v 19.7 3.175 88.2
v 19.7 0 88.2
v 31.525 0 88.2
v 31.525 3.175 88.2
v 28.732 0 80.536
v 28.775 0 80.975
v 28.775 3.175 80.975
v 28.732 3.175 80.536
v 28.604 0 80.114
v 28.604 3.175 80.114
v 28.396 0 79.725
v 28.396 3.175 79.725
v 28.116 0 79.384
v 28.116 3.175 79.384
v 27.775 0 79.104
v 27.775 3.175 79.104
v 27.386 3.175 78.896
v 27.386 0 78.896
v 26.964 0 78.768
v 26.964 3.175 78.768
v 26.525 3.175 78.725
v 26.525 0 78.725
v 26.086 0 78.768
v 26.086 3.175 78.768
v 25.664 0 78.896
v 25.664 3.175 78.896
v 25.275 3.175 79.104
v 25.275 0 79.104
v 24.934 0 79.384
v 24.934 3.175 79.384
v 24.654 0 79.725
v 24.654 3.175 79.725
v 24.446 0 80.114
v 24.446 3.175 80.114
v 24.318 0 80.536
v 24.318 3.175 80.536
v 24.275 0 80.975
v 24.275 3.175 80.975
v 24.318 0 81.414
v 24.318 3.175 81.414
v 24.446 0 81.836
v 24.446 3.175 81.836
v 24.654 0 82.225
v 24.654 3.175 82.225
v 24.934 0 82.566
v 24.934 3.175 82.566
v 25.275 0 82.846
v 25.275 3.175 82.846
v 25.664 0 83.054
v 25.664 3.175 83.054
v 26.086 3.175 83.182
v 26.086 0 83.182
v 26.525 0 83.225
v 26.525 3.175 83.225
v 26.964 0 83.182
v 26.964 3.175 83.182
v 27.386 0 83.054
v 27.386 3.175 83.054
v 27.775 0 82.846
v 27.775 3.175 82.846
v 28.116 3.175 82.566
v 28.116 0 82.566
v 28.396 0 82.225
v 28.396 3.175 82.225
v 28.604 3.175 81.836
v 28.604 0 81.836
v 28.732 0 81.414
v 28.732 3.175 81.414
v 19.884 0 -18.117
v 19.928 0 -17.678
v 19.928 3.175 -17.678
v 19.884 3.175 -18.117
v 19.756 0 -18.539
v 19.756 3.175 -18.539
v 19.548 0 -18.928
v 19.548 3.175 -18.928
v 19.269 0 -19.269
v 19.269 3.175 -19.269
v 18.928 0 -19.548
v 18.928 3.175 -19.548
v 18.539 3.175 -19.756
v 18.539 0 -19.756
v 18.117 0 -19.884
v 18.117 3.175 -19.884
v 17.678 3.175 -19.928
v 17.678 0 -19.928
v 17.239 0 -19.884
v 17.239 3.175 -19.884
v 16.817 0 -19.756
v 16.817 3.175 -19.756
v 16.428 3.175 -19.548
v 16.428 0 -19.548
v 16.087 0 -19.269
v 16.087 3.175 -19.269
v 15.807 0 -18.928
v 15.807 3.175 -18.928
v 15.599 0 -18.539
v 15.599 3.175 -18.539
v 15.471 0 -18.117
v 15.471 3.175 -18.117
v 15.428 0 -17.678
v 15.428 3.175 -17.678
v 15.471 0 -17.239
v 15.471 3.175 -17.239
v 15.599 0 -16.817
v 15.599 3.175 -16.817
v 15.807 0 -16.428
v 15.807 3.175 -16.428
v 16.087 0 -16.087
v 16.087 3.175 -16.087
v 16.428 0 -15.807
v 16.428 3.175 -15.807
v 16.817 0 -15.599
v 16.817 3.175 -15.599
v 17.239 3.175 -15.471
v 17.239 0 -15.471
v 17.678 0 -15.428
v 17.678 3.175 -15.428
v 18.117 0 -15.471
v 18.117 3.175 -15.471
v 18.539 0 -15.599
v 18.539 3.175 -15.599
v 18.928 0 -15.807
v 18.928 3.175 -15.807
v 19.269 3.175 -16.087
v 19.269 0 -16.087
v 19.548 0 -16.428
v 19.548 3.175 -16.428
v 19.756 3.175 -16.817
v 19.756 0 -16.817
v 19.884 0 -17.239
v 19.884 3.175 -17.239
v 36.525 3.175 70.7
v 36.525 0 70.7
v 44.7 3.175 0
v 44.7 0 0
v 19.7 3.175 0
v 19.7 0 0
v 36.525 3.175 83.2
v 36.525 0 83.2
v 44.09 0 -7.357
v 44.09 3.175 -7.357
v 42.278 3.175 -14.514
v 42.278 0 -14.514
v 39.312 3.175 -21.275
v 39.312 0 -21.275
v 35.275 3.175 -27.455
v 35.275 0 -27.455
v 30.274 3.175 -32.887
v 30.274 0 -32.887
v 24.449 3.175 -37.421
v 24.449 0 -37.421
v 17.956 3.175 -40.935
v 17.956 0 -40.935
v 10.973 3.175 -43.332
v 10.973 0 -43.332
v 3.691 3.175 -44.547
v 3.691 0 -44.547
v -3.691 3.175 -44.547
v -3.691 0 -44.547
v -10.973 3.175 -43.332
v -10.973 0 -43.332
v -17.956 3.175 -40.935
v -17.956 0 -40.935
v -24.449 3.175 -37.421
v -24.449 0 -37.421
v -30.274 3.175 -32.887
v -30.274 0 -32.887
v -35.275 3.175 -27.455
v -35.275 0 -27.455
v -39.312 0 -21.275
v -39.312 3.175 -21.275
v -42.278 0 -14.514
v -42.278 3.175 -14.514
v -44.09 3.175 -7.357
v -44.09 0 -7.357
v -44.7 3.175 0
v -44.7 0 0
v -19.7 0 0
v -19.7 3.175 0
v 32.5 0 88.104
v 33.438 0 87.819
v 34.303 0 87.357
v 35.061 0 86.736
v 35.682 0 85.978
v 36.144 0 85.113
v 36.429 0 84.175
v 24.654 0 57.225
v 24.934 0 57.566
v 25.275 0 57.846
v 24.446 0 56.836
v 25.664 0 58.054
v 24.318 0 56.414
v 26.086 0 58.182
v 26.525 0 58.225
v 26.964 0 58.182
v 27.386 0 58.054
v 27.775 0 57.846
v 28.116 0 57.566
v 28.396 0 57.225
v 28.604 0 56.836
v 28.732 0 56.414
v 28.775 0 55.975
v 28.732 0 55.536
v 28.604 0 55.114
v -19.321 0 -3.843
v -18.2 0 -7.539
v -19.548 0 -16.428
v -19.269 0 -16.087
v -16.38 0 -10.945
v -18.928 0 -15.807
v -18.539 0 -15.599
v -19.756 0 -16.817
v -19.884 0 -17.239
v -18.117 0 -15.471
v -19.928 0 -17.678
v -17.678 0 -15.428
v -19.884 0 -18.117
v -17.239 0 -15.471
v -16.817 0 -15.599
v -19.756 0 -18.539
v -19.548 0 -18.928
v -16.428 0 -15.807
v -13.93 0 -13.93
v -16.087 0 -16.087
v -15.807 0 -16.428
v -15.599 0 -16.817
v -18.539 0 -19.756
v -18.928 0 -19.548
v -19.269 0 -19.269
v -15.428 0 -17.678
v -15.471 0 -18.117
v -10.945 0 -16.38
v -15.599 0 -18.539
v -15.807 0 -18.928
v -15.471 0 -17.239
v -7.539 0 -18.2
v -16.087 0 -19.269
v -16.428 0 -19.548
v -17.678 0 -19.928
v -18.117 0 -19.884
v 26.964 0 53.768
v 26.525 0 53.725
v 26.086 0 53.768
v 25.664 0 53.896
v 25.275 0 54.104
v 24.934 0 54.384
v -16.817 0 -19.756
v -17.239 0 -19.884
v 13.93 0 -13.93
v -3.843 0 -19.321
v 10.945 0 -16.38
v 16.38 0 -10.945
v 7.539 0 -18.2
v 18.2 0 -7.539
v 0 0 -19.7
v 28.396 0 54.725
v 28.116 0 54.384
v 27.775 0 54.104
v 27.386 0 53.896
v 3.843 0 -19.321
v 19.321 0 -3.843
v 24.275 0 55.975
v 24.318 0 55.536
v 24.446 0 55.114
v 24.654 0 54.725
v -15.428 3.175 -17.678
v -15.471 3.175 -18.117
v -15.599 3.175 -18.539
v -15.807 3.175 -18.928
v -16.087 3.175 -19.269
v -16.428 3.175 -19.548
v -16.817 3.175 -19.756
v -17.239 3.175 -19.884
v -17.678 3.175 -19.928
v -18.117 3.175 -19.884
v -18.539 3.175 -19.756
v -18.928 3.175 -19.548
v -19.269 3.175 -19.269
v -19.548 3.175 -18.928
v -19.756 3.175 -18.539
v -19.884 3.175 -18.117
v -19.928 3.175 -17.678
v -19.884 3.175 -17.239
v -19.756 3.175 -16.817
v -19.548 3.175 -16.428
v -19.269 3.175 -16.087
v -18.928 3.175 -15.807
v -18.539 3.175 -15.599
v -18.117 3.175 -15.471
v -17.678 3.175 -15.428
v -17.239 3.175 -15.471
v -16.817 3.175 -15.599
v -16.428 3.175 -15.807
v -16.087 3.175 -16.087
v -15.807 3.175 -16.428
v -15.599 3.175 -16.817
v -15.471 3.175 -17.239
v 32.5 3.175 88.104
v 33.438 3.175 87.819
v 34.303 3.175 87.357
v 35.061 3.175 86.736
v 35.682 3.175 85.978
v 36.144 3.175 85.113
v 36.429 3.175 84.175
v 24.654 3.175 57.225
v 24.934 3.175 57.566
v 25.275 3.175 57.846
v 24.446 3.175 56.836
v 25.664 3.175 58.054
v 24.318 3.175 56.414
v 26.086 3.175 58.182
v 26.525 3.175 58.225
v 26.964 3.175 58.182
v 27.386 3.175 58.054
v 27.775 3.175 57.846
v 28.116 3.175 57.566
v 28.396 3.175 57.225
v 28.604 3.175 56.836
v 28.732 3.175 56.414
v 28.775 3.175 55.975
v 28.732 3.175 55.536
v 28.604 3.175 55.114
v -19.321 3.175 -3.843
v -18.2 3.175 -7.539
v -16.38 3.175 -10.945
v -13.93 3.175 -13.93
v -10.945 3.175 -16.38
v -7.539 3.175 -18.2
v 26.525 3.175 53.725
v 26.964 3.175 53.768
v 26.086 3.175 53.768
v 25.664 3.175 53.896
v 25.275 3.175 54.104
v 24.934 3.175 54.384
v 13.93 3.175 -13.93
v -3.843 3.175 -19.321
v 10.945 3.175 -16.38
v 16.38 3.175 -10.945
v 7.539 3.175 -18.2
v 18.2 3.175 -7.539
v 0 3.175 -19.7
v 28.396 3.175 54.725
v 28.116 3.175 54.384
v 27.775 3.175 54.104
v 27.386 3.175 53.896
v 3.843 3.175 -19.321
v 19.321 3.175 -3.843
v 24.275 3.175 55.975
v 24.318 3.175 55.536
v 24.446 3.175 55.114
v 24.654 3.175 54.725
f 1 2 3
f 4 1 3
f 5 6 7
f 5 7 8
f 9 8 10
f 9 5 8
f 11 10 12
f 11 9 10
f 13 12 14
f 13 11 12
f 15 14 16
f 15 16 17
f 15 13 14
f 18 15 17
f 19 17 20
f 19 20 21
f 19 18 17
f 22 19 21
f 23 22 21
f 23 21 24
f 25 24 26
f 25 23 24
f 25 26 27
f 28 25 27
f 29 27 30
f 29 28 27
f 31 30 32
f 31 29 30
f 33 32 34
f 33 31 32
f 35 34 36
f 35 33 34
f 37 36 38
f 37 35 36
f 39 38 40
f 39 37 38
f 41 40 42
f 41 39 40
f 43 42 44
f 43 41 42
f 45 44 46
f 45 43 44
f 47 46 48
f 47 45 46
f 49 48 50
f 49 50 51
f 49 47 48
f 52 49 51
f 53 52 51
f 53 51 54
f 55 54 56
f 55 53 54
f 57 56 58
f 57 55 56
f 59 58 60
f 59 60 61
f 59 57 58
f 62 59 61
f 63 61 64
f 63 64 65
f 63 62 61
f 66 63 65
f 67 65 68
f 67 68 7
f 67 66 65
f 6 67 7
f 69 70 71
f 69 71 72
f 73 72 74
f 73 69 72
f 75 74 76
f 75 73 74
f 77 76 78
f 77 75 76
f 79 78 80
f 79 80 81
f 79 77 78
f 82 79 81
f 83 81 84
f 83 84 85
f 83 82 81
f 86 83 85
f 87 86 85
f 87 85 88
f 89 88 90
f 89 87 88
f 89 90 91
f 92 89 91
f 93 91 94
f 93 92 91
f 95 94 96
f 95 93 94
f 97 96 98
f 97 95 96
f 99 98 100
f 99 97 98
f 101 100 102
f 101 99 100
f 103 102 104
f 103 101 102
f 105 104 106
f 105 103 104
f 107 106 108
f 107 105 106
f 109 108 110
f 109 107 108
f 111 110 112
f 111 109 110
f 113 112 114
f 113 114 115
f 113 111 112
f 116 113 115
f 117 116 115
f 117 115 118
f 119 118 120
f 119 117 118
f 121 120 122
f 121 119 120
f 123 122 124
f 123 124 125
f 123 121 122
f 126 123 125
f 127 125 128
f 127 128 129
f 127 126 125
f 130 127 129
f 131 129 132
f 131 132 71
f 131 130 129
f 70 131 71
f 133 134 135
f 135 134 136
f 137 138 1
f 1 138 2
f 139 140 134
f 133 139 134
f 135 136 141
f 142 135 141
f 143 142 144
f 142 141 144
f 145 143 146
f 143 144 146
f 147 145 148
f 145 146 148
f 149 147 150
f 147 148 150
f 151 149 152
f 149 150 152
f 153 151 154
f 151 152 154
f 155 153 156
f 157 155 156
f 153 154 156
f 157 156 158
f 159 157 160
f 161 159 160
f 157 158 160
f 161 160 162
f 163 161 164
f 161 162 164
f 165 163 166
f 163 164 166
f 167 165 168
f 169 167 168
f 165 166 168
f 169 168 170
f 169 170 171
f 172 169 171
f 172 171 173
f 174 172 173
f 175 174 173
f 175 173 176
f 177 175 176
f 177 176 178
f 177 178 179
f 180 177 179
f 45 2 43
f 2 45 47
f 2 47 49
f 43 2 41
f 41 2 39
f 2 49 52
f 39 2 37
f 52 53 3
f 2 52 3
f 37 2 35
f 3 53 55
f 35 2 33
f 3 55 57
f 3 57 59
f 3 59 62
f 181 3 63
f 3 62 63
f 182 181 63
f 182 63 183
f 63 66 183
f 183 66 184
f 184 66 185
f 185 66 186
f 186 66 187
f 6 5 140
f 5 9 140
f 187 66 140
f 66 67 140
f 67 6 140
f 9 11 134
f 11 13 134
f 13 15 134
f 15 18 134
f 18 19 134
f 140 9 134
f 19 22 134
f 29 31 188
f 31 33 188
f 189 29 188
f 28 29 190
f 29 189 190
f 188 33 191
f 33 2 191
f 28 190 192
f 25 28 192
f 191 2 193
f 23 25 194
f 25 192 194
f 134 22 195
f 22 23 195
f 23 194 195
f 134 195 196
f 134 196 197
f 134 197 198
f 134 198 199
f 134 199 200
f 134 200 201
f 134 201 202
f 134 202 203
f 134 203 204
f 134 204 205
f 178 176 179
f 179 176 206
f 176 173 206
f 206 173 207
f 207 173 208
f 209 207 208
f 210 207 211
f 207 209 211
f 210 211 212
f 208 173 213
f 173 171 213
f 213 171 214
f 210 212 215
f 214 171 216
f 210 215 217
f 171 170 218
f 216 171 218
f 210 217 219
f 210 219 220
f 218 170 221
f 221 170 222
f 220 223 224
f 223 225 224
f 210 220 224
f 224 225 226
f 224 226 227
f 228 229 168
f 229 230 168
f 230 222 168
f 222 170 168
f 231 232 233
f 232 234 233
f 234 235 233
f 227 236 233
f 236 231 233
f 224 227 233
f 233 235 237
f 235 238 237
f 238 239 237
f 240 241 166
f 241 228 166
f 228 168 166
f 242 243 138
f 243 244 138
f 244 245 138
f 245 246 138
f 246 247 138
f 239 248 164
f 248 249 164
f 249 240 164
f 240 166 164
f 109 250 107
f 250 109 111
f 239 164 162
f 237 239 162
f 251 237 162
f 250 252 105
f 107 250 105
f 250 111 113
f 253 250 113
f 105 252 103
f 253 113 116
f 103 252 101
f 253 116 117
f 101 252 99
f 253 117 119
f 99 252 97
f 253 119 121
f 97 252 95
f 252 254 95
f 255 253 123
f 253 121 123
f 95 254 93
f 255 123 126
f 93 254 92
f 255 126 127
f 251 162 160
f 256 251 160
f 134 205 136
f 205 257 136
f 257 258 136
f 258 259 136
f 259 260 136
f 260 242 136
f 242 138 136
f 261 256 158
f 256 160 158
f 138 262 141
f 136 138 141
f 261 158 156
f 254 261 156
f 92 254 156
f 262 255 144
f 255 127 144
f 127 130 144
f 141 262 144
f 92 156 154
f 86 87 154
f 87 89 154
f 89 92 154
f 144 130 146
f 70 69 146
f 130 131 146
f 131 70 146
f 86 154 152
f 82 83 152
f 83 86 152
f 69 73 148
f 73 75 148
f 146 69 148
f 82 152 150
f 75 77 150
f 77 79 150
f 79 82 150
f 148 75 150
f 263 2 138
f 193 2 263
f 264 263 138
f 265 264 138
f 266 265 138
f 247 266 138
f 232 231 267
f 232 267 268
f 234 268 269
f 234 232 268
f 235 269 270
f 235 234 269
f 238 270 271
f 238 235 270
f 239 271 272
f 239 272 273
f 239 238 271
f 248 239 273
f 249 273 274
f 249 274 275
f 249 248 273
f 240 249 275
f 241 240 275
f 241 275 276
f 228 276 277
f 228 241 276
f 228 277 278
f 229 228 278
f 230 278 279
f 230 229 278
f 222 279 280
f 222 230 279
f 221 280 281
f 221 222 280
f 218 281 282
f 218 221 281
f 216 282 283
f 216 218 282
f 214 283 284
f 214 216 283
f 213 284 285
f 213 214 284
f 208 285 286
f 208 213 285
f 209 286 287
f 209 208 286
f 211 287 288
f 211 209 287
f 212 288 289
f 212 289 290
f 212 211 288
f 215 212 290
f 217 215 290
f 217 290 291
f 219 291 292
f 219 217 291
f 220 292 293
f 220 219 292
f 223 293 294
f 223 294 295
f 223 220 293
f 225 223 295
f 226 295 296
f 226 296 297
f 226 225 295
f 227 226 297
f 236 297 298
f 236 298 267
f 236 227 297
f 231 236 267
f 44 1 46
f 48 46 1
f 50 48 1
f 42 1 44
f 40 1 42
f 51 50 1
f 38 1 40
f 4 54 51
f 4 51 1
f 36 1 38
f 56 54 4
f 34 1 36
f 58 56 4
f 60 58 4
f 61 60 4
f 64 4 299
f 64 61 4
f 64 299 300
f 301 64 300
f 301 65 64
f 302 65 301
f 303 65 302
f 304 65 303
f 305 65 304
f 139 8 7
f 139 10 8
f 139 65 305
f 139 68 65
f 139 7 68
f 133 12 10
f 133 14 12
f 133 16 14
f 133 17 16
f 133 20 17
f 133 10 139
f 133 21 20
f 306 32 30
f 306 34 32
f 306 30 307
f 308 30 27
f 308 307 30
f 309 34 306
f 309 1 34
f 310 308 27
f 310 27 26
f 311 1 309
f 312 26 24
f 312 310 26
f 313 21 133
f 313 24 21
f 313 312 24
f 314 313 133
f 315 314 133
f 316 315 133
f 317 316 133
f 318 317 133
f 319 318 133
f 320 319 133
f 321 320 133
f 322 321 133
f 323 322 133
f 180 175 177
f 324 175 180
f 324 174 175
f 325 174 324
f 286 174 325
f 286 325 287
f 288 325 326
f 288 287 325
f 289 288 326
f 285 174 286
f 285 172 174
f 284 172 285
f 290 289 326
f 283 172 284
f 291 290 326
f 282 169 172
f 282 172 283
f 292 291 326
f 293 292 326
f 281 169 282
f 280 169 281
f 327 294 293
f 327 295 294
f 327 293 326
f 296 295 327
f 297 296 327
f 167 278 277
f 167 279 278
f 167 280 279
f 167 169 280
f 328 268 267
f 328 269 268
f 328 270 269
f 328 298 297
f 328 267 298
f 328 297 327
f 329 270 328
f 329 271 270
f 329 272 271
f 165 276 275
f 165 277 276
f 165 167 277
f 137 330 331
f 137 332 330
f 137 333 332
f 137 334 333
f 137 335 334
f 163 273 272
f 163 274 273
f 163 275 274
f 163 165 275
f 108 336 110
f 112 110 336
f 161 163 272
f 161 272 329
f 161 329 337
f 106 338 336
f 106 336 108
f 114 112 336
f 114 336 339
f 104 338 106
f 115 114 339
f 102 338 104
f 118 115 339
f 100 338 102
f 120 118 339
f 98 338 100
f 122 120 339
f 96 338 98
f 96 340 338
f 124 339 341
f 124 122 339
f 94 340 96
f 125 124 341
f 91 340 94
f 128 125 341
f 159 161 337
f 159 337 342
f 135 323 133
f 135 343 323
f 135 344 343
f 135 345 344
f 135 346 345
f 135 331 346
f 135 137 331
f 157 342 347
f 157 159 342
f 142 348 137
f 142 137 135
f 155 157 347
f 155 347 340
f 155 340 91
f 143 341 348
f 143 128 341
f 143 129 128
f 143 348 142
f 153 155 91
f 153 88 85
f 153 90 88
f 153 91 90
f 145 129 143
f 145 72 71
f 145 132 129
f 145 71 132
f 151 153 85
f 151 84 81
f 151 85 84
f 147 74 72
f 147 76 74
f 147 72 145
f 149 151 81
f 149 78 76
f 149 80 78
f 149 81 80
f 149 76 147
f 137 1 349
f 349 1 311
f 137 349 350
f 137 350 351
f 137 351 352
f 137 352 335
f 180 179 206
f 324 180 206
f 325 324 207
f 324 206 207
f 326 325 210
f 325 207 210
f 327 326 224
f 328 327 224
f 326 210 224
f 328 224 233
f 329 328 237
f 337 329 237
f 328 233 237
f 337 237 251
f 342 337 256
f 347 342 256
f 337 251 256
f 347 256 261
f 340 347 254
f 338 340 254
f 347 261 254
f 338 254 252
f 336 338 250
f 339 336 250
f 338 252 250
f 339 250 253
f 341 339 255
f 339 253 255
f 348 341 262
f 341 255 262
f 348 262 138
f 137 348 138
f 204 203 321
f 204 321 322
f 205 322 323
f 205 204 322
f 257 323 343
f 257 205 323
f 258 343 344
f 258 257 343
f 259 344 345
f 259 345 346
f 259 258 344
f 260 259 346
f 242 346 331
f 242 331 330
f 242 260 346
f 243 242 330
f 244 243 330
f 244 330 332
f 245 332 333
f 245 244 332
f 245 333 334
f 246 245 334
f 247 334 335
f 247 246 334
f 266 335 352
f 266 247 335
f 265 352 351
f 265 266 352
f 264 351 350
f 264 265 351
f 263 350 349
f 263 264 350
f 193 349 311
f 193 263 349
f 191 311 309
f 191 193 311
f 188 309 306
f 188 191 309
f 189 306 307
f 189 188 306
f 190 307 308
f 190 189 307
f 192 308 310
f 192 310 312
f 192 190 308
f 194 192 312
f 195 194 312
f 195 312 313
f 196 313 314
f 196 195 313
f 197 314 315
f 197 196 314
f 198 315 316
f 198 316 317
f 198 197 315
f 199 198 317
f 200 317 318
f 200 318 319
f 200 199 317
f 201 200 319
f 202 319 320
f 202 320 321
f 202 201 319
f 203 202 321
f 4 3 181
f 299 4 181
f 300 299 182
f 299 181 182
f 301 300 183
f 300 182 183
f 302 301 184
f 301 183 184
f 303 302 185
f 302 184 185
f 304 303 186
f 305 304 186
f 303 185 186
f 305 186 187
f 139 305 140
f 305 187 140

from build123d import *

# Parameters (mm, degrees)
SKETCH2_R           = 2.25
BOSS_EXTRUDE1_DEPTH = 3.175


with BuildPart() as part:
    # Sketch2 → Boss-Extrude1 (new body)
    with BuildSketch(Plane(origin=(0, 0, 0), x_dir=(1, 0, 0), z_dir=(0, 1, 0))):
        with BuildLine():
            Line((19.7, -88.2), (31.525, -88.2))
            ThreePointArc((31.525, -88.2), (35.060533906, -86.735533906), (36.525, -83.2))
            Line((36.525, -83.2), (36.525, -70.7))
            Line((36.525, -70.7), (44.7, 0))
            ThreePointArc((44.7, 0), (0, 44.7), (-44.7, 0))
            Line((-44.7, 0), (-19.7, 0))
            ThreePointArc((-19.7, 0), (0, 19.7), (19.7, 0))
            Line((19.7, 0), (19.7, -88.2))
        make_face()
        with Locations((26.525, -80.975)):
            Circle(SKETCH2_R, mode=Mode.SUBTRACT)
        with Locations((26.525, -55.975)):
            Circle(SKETCH2_R, mode=Mode.SUBTRACT)
        with Locations((-17.67766953, 17.67766953)):
            Circle(SKETCH2_R, mode=Mode.SUBTRACT)
        with Locations((17.67766953, 17.67766953)):
            Circle(SKETCH2_R, mode=Mode.SUBTRACT)
    extrude(amount=BOSS_EXTRUDE1_DEPTH)


solid = part.part
